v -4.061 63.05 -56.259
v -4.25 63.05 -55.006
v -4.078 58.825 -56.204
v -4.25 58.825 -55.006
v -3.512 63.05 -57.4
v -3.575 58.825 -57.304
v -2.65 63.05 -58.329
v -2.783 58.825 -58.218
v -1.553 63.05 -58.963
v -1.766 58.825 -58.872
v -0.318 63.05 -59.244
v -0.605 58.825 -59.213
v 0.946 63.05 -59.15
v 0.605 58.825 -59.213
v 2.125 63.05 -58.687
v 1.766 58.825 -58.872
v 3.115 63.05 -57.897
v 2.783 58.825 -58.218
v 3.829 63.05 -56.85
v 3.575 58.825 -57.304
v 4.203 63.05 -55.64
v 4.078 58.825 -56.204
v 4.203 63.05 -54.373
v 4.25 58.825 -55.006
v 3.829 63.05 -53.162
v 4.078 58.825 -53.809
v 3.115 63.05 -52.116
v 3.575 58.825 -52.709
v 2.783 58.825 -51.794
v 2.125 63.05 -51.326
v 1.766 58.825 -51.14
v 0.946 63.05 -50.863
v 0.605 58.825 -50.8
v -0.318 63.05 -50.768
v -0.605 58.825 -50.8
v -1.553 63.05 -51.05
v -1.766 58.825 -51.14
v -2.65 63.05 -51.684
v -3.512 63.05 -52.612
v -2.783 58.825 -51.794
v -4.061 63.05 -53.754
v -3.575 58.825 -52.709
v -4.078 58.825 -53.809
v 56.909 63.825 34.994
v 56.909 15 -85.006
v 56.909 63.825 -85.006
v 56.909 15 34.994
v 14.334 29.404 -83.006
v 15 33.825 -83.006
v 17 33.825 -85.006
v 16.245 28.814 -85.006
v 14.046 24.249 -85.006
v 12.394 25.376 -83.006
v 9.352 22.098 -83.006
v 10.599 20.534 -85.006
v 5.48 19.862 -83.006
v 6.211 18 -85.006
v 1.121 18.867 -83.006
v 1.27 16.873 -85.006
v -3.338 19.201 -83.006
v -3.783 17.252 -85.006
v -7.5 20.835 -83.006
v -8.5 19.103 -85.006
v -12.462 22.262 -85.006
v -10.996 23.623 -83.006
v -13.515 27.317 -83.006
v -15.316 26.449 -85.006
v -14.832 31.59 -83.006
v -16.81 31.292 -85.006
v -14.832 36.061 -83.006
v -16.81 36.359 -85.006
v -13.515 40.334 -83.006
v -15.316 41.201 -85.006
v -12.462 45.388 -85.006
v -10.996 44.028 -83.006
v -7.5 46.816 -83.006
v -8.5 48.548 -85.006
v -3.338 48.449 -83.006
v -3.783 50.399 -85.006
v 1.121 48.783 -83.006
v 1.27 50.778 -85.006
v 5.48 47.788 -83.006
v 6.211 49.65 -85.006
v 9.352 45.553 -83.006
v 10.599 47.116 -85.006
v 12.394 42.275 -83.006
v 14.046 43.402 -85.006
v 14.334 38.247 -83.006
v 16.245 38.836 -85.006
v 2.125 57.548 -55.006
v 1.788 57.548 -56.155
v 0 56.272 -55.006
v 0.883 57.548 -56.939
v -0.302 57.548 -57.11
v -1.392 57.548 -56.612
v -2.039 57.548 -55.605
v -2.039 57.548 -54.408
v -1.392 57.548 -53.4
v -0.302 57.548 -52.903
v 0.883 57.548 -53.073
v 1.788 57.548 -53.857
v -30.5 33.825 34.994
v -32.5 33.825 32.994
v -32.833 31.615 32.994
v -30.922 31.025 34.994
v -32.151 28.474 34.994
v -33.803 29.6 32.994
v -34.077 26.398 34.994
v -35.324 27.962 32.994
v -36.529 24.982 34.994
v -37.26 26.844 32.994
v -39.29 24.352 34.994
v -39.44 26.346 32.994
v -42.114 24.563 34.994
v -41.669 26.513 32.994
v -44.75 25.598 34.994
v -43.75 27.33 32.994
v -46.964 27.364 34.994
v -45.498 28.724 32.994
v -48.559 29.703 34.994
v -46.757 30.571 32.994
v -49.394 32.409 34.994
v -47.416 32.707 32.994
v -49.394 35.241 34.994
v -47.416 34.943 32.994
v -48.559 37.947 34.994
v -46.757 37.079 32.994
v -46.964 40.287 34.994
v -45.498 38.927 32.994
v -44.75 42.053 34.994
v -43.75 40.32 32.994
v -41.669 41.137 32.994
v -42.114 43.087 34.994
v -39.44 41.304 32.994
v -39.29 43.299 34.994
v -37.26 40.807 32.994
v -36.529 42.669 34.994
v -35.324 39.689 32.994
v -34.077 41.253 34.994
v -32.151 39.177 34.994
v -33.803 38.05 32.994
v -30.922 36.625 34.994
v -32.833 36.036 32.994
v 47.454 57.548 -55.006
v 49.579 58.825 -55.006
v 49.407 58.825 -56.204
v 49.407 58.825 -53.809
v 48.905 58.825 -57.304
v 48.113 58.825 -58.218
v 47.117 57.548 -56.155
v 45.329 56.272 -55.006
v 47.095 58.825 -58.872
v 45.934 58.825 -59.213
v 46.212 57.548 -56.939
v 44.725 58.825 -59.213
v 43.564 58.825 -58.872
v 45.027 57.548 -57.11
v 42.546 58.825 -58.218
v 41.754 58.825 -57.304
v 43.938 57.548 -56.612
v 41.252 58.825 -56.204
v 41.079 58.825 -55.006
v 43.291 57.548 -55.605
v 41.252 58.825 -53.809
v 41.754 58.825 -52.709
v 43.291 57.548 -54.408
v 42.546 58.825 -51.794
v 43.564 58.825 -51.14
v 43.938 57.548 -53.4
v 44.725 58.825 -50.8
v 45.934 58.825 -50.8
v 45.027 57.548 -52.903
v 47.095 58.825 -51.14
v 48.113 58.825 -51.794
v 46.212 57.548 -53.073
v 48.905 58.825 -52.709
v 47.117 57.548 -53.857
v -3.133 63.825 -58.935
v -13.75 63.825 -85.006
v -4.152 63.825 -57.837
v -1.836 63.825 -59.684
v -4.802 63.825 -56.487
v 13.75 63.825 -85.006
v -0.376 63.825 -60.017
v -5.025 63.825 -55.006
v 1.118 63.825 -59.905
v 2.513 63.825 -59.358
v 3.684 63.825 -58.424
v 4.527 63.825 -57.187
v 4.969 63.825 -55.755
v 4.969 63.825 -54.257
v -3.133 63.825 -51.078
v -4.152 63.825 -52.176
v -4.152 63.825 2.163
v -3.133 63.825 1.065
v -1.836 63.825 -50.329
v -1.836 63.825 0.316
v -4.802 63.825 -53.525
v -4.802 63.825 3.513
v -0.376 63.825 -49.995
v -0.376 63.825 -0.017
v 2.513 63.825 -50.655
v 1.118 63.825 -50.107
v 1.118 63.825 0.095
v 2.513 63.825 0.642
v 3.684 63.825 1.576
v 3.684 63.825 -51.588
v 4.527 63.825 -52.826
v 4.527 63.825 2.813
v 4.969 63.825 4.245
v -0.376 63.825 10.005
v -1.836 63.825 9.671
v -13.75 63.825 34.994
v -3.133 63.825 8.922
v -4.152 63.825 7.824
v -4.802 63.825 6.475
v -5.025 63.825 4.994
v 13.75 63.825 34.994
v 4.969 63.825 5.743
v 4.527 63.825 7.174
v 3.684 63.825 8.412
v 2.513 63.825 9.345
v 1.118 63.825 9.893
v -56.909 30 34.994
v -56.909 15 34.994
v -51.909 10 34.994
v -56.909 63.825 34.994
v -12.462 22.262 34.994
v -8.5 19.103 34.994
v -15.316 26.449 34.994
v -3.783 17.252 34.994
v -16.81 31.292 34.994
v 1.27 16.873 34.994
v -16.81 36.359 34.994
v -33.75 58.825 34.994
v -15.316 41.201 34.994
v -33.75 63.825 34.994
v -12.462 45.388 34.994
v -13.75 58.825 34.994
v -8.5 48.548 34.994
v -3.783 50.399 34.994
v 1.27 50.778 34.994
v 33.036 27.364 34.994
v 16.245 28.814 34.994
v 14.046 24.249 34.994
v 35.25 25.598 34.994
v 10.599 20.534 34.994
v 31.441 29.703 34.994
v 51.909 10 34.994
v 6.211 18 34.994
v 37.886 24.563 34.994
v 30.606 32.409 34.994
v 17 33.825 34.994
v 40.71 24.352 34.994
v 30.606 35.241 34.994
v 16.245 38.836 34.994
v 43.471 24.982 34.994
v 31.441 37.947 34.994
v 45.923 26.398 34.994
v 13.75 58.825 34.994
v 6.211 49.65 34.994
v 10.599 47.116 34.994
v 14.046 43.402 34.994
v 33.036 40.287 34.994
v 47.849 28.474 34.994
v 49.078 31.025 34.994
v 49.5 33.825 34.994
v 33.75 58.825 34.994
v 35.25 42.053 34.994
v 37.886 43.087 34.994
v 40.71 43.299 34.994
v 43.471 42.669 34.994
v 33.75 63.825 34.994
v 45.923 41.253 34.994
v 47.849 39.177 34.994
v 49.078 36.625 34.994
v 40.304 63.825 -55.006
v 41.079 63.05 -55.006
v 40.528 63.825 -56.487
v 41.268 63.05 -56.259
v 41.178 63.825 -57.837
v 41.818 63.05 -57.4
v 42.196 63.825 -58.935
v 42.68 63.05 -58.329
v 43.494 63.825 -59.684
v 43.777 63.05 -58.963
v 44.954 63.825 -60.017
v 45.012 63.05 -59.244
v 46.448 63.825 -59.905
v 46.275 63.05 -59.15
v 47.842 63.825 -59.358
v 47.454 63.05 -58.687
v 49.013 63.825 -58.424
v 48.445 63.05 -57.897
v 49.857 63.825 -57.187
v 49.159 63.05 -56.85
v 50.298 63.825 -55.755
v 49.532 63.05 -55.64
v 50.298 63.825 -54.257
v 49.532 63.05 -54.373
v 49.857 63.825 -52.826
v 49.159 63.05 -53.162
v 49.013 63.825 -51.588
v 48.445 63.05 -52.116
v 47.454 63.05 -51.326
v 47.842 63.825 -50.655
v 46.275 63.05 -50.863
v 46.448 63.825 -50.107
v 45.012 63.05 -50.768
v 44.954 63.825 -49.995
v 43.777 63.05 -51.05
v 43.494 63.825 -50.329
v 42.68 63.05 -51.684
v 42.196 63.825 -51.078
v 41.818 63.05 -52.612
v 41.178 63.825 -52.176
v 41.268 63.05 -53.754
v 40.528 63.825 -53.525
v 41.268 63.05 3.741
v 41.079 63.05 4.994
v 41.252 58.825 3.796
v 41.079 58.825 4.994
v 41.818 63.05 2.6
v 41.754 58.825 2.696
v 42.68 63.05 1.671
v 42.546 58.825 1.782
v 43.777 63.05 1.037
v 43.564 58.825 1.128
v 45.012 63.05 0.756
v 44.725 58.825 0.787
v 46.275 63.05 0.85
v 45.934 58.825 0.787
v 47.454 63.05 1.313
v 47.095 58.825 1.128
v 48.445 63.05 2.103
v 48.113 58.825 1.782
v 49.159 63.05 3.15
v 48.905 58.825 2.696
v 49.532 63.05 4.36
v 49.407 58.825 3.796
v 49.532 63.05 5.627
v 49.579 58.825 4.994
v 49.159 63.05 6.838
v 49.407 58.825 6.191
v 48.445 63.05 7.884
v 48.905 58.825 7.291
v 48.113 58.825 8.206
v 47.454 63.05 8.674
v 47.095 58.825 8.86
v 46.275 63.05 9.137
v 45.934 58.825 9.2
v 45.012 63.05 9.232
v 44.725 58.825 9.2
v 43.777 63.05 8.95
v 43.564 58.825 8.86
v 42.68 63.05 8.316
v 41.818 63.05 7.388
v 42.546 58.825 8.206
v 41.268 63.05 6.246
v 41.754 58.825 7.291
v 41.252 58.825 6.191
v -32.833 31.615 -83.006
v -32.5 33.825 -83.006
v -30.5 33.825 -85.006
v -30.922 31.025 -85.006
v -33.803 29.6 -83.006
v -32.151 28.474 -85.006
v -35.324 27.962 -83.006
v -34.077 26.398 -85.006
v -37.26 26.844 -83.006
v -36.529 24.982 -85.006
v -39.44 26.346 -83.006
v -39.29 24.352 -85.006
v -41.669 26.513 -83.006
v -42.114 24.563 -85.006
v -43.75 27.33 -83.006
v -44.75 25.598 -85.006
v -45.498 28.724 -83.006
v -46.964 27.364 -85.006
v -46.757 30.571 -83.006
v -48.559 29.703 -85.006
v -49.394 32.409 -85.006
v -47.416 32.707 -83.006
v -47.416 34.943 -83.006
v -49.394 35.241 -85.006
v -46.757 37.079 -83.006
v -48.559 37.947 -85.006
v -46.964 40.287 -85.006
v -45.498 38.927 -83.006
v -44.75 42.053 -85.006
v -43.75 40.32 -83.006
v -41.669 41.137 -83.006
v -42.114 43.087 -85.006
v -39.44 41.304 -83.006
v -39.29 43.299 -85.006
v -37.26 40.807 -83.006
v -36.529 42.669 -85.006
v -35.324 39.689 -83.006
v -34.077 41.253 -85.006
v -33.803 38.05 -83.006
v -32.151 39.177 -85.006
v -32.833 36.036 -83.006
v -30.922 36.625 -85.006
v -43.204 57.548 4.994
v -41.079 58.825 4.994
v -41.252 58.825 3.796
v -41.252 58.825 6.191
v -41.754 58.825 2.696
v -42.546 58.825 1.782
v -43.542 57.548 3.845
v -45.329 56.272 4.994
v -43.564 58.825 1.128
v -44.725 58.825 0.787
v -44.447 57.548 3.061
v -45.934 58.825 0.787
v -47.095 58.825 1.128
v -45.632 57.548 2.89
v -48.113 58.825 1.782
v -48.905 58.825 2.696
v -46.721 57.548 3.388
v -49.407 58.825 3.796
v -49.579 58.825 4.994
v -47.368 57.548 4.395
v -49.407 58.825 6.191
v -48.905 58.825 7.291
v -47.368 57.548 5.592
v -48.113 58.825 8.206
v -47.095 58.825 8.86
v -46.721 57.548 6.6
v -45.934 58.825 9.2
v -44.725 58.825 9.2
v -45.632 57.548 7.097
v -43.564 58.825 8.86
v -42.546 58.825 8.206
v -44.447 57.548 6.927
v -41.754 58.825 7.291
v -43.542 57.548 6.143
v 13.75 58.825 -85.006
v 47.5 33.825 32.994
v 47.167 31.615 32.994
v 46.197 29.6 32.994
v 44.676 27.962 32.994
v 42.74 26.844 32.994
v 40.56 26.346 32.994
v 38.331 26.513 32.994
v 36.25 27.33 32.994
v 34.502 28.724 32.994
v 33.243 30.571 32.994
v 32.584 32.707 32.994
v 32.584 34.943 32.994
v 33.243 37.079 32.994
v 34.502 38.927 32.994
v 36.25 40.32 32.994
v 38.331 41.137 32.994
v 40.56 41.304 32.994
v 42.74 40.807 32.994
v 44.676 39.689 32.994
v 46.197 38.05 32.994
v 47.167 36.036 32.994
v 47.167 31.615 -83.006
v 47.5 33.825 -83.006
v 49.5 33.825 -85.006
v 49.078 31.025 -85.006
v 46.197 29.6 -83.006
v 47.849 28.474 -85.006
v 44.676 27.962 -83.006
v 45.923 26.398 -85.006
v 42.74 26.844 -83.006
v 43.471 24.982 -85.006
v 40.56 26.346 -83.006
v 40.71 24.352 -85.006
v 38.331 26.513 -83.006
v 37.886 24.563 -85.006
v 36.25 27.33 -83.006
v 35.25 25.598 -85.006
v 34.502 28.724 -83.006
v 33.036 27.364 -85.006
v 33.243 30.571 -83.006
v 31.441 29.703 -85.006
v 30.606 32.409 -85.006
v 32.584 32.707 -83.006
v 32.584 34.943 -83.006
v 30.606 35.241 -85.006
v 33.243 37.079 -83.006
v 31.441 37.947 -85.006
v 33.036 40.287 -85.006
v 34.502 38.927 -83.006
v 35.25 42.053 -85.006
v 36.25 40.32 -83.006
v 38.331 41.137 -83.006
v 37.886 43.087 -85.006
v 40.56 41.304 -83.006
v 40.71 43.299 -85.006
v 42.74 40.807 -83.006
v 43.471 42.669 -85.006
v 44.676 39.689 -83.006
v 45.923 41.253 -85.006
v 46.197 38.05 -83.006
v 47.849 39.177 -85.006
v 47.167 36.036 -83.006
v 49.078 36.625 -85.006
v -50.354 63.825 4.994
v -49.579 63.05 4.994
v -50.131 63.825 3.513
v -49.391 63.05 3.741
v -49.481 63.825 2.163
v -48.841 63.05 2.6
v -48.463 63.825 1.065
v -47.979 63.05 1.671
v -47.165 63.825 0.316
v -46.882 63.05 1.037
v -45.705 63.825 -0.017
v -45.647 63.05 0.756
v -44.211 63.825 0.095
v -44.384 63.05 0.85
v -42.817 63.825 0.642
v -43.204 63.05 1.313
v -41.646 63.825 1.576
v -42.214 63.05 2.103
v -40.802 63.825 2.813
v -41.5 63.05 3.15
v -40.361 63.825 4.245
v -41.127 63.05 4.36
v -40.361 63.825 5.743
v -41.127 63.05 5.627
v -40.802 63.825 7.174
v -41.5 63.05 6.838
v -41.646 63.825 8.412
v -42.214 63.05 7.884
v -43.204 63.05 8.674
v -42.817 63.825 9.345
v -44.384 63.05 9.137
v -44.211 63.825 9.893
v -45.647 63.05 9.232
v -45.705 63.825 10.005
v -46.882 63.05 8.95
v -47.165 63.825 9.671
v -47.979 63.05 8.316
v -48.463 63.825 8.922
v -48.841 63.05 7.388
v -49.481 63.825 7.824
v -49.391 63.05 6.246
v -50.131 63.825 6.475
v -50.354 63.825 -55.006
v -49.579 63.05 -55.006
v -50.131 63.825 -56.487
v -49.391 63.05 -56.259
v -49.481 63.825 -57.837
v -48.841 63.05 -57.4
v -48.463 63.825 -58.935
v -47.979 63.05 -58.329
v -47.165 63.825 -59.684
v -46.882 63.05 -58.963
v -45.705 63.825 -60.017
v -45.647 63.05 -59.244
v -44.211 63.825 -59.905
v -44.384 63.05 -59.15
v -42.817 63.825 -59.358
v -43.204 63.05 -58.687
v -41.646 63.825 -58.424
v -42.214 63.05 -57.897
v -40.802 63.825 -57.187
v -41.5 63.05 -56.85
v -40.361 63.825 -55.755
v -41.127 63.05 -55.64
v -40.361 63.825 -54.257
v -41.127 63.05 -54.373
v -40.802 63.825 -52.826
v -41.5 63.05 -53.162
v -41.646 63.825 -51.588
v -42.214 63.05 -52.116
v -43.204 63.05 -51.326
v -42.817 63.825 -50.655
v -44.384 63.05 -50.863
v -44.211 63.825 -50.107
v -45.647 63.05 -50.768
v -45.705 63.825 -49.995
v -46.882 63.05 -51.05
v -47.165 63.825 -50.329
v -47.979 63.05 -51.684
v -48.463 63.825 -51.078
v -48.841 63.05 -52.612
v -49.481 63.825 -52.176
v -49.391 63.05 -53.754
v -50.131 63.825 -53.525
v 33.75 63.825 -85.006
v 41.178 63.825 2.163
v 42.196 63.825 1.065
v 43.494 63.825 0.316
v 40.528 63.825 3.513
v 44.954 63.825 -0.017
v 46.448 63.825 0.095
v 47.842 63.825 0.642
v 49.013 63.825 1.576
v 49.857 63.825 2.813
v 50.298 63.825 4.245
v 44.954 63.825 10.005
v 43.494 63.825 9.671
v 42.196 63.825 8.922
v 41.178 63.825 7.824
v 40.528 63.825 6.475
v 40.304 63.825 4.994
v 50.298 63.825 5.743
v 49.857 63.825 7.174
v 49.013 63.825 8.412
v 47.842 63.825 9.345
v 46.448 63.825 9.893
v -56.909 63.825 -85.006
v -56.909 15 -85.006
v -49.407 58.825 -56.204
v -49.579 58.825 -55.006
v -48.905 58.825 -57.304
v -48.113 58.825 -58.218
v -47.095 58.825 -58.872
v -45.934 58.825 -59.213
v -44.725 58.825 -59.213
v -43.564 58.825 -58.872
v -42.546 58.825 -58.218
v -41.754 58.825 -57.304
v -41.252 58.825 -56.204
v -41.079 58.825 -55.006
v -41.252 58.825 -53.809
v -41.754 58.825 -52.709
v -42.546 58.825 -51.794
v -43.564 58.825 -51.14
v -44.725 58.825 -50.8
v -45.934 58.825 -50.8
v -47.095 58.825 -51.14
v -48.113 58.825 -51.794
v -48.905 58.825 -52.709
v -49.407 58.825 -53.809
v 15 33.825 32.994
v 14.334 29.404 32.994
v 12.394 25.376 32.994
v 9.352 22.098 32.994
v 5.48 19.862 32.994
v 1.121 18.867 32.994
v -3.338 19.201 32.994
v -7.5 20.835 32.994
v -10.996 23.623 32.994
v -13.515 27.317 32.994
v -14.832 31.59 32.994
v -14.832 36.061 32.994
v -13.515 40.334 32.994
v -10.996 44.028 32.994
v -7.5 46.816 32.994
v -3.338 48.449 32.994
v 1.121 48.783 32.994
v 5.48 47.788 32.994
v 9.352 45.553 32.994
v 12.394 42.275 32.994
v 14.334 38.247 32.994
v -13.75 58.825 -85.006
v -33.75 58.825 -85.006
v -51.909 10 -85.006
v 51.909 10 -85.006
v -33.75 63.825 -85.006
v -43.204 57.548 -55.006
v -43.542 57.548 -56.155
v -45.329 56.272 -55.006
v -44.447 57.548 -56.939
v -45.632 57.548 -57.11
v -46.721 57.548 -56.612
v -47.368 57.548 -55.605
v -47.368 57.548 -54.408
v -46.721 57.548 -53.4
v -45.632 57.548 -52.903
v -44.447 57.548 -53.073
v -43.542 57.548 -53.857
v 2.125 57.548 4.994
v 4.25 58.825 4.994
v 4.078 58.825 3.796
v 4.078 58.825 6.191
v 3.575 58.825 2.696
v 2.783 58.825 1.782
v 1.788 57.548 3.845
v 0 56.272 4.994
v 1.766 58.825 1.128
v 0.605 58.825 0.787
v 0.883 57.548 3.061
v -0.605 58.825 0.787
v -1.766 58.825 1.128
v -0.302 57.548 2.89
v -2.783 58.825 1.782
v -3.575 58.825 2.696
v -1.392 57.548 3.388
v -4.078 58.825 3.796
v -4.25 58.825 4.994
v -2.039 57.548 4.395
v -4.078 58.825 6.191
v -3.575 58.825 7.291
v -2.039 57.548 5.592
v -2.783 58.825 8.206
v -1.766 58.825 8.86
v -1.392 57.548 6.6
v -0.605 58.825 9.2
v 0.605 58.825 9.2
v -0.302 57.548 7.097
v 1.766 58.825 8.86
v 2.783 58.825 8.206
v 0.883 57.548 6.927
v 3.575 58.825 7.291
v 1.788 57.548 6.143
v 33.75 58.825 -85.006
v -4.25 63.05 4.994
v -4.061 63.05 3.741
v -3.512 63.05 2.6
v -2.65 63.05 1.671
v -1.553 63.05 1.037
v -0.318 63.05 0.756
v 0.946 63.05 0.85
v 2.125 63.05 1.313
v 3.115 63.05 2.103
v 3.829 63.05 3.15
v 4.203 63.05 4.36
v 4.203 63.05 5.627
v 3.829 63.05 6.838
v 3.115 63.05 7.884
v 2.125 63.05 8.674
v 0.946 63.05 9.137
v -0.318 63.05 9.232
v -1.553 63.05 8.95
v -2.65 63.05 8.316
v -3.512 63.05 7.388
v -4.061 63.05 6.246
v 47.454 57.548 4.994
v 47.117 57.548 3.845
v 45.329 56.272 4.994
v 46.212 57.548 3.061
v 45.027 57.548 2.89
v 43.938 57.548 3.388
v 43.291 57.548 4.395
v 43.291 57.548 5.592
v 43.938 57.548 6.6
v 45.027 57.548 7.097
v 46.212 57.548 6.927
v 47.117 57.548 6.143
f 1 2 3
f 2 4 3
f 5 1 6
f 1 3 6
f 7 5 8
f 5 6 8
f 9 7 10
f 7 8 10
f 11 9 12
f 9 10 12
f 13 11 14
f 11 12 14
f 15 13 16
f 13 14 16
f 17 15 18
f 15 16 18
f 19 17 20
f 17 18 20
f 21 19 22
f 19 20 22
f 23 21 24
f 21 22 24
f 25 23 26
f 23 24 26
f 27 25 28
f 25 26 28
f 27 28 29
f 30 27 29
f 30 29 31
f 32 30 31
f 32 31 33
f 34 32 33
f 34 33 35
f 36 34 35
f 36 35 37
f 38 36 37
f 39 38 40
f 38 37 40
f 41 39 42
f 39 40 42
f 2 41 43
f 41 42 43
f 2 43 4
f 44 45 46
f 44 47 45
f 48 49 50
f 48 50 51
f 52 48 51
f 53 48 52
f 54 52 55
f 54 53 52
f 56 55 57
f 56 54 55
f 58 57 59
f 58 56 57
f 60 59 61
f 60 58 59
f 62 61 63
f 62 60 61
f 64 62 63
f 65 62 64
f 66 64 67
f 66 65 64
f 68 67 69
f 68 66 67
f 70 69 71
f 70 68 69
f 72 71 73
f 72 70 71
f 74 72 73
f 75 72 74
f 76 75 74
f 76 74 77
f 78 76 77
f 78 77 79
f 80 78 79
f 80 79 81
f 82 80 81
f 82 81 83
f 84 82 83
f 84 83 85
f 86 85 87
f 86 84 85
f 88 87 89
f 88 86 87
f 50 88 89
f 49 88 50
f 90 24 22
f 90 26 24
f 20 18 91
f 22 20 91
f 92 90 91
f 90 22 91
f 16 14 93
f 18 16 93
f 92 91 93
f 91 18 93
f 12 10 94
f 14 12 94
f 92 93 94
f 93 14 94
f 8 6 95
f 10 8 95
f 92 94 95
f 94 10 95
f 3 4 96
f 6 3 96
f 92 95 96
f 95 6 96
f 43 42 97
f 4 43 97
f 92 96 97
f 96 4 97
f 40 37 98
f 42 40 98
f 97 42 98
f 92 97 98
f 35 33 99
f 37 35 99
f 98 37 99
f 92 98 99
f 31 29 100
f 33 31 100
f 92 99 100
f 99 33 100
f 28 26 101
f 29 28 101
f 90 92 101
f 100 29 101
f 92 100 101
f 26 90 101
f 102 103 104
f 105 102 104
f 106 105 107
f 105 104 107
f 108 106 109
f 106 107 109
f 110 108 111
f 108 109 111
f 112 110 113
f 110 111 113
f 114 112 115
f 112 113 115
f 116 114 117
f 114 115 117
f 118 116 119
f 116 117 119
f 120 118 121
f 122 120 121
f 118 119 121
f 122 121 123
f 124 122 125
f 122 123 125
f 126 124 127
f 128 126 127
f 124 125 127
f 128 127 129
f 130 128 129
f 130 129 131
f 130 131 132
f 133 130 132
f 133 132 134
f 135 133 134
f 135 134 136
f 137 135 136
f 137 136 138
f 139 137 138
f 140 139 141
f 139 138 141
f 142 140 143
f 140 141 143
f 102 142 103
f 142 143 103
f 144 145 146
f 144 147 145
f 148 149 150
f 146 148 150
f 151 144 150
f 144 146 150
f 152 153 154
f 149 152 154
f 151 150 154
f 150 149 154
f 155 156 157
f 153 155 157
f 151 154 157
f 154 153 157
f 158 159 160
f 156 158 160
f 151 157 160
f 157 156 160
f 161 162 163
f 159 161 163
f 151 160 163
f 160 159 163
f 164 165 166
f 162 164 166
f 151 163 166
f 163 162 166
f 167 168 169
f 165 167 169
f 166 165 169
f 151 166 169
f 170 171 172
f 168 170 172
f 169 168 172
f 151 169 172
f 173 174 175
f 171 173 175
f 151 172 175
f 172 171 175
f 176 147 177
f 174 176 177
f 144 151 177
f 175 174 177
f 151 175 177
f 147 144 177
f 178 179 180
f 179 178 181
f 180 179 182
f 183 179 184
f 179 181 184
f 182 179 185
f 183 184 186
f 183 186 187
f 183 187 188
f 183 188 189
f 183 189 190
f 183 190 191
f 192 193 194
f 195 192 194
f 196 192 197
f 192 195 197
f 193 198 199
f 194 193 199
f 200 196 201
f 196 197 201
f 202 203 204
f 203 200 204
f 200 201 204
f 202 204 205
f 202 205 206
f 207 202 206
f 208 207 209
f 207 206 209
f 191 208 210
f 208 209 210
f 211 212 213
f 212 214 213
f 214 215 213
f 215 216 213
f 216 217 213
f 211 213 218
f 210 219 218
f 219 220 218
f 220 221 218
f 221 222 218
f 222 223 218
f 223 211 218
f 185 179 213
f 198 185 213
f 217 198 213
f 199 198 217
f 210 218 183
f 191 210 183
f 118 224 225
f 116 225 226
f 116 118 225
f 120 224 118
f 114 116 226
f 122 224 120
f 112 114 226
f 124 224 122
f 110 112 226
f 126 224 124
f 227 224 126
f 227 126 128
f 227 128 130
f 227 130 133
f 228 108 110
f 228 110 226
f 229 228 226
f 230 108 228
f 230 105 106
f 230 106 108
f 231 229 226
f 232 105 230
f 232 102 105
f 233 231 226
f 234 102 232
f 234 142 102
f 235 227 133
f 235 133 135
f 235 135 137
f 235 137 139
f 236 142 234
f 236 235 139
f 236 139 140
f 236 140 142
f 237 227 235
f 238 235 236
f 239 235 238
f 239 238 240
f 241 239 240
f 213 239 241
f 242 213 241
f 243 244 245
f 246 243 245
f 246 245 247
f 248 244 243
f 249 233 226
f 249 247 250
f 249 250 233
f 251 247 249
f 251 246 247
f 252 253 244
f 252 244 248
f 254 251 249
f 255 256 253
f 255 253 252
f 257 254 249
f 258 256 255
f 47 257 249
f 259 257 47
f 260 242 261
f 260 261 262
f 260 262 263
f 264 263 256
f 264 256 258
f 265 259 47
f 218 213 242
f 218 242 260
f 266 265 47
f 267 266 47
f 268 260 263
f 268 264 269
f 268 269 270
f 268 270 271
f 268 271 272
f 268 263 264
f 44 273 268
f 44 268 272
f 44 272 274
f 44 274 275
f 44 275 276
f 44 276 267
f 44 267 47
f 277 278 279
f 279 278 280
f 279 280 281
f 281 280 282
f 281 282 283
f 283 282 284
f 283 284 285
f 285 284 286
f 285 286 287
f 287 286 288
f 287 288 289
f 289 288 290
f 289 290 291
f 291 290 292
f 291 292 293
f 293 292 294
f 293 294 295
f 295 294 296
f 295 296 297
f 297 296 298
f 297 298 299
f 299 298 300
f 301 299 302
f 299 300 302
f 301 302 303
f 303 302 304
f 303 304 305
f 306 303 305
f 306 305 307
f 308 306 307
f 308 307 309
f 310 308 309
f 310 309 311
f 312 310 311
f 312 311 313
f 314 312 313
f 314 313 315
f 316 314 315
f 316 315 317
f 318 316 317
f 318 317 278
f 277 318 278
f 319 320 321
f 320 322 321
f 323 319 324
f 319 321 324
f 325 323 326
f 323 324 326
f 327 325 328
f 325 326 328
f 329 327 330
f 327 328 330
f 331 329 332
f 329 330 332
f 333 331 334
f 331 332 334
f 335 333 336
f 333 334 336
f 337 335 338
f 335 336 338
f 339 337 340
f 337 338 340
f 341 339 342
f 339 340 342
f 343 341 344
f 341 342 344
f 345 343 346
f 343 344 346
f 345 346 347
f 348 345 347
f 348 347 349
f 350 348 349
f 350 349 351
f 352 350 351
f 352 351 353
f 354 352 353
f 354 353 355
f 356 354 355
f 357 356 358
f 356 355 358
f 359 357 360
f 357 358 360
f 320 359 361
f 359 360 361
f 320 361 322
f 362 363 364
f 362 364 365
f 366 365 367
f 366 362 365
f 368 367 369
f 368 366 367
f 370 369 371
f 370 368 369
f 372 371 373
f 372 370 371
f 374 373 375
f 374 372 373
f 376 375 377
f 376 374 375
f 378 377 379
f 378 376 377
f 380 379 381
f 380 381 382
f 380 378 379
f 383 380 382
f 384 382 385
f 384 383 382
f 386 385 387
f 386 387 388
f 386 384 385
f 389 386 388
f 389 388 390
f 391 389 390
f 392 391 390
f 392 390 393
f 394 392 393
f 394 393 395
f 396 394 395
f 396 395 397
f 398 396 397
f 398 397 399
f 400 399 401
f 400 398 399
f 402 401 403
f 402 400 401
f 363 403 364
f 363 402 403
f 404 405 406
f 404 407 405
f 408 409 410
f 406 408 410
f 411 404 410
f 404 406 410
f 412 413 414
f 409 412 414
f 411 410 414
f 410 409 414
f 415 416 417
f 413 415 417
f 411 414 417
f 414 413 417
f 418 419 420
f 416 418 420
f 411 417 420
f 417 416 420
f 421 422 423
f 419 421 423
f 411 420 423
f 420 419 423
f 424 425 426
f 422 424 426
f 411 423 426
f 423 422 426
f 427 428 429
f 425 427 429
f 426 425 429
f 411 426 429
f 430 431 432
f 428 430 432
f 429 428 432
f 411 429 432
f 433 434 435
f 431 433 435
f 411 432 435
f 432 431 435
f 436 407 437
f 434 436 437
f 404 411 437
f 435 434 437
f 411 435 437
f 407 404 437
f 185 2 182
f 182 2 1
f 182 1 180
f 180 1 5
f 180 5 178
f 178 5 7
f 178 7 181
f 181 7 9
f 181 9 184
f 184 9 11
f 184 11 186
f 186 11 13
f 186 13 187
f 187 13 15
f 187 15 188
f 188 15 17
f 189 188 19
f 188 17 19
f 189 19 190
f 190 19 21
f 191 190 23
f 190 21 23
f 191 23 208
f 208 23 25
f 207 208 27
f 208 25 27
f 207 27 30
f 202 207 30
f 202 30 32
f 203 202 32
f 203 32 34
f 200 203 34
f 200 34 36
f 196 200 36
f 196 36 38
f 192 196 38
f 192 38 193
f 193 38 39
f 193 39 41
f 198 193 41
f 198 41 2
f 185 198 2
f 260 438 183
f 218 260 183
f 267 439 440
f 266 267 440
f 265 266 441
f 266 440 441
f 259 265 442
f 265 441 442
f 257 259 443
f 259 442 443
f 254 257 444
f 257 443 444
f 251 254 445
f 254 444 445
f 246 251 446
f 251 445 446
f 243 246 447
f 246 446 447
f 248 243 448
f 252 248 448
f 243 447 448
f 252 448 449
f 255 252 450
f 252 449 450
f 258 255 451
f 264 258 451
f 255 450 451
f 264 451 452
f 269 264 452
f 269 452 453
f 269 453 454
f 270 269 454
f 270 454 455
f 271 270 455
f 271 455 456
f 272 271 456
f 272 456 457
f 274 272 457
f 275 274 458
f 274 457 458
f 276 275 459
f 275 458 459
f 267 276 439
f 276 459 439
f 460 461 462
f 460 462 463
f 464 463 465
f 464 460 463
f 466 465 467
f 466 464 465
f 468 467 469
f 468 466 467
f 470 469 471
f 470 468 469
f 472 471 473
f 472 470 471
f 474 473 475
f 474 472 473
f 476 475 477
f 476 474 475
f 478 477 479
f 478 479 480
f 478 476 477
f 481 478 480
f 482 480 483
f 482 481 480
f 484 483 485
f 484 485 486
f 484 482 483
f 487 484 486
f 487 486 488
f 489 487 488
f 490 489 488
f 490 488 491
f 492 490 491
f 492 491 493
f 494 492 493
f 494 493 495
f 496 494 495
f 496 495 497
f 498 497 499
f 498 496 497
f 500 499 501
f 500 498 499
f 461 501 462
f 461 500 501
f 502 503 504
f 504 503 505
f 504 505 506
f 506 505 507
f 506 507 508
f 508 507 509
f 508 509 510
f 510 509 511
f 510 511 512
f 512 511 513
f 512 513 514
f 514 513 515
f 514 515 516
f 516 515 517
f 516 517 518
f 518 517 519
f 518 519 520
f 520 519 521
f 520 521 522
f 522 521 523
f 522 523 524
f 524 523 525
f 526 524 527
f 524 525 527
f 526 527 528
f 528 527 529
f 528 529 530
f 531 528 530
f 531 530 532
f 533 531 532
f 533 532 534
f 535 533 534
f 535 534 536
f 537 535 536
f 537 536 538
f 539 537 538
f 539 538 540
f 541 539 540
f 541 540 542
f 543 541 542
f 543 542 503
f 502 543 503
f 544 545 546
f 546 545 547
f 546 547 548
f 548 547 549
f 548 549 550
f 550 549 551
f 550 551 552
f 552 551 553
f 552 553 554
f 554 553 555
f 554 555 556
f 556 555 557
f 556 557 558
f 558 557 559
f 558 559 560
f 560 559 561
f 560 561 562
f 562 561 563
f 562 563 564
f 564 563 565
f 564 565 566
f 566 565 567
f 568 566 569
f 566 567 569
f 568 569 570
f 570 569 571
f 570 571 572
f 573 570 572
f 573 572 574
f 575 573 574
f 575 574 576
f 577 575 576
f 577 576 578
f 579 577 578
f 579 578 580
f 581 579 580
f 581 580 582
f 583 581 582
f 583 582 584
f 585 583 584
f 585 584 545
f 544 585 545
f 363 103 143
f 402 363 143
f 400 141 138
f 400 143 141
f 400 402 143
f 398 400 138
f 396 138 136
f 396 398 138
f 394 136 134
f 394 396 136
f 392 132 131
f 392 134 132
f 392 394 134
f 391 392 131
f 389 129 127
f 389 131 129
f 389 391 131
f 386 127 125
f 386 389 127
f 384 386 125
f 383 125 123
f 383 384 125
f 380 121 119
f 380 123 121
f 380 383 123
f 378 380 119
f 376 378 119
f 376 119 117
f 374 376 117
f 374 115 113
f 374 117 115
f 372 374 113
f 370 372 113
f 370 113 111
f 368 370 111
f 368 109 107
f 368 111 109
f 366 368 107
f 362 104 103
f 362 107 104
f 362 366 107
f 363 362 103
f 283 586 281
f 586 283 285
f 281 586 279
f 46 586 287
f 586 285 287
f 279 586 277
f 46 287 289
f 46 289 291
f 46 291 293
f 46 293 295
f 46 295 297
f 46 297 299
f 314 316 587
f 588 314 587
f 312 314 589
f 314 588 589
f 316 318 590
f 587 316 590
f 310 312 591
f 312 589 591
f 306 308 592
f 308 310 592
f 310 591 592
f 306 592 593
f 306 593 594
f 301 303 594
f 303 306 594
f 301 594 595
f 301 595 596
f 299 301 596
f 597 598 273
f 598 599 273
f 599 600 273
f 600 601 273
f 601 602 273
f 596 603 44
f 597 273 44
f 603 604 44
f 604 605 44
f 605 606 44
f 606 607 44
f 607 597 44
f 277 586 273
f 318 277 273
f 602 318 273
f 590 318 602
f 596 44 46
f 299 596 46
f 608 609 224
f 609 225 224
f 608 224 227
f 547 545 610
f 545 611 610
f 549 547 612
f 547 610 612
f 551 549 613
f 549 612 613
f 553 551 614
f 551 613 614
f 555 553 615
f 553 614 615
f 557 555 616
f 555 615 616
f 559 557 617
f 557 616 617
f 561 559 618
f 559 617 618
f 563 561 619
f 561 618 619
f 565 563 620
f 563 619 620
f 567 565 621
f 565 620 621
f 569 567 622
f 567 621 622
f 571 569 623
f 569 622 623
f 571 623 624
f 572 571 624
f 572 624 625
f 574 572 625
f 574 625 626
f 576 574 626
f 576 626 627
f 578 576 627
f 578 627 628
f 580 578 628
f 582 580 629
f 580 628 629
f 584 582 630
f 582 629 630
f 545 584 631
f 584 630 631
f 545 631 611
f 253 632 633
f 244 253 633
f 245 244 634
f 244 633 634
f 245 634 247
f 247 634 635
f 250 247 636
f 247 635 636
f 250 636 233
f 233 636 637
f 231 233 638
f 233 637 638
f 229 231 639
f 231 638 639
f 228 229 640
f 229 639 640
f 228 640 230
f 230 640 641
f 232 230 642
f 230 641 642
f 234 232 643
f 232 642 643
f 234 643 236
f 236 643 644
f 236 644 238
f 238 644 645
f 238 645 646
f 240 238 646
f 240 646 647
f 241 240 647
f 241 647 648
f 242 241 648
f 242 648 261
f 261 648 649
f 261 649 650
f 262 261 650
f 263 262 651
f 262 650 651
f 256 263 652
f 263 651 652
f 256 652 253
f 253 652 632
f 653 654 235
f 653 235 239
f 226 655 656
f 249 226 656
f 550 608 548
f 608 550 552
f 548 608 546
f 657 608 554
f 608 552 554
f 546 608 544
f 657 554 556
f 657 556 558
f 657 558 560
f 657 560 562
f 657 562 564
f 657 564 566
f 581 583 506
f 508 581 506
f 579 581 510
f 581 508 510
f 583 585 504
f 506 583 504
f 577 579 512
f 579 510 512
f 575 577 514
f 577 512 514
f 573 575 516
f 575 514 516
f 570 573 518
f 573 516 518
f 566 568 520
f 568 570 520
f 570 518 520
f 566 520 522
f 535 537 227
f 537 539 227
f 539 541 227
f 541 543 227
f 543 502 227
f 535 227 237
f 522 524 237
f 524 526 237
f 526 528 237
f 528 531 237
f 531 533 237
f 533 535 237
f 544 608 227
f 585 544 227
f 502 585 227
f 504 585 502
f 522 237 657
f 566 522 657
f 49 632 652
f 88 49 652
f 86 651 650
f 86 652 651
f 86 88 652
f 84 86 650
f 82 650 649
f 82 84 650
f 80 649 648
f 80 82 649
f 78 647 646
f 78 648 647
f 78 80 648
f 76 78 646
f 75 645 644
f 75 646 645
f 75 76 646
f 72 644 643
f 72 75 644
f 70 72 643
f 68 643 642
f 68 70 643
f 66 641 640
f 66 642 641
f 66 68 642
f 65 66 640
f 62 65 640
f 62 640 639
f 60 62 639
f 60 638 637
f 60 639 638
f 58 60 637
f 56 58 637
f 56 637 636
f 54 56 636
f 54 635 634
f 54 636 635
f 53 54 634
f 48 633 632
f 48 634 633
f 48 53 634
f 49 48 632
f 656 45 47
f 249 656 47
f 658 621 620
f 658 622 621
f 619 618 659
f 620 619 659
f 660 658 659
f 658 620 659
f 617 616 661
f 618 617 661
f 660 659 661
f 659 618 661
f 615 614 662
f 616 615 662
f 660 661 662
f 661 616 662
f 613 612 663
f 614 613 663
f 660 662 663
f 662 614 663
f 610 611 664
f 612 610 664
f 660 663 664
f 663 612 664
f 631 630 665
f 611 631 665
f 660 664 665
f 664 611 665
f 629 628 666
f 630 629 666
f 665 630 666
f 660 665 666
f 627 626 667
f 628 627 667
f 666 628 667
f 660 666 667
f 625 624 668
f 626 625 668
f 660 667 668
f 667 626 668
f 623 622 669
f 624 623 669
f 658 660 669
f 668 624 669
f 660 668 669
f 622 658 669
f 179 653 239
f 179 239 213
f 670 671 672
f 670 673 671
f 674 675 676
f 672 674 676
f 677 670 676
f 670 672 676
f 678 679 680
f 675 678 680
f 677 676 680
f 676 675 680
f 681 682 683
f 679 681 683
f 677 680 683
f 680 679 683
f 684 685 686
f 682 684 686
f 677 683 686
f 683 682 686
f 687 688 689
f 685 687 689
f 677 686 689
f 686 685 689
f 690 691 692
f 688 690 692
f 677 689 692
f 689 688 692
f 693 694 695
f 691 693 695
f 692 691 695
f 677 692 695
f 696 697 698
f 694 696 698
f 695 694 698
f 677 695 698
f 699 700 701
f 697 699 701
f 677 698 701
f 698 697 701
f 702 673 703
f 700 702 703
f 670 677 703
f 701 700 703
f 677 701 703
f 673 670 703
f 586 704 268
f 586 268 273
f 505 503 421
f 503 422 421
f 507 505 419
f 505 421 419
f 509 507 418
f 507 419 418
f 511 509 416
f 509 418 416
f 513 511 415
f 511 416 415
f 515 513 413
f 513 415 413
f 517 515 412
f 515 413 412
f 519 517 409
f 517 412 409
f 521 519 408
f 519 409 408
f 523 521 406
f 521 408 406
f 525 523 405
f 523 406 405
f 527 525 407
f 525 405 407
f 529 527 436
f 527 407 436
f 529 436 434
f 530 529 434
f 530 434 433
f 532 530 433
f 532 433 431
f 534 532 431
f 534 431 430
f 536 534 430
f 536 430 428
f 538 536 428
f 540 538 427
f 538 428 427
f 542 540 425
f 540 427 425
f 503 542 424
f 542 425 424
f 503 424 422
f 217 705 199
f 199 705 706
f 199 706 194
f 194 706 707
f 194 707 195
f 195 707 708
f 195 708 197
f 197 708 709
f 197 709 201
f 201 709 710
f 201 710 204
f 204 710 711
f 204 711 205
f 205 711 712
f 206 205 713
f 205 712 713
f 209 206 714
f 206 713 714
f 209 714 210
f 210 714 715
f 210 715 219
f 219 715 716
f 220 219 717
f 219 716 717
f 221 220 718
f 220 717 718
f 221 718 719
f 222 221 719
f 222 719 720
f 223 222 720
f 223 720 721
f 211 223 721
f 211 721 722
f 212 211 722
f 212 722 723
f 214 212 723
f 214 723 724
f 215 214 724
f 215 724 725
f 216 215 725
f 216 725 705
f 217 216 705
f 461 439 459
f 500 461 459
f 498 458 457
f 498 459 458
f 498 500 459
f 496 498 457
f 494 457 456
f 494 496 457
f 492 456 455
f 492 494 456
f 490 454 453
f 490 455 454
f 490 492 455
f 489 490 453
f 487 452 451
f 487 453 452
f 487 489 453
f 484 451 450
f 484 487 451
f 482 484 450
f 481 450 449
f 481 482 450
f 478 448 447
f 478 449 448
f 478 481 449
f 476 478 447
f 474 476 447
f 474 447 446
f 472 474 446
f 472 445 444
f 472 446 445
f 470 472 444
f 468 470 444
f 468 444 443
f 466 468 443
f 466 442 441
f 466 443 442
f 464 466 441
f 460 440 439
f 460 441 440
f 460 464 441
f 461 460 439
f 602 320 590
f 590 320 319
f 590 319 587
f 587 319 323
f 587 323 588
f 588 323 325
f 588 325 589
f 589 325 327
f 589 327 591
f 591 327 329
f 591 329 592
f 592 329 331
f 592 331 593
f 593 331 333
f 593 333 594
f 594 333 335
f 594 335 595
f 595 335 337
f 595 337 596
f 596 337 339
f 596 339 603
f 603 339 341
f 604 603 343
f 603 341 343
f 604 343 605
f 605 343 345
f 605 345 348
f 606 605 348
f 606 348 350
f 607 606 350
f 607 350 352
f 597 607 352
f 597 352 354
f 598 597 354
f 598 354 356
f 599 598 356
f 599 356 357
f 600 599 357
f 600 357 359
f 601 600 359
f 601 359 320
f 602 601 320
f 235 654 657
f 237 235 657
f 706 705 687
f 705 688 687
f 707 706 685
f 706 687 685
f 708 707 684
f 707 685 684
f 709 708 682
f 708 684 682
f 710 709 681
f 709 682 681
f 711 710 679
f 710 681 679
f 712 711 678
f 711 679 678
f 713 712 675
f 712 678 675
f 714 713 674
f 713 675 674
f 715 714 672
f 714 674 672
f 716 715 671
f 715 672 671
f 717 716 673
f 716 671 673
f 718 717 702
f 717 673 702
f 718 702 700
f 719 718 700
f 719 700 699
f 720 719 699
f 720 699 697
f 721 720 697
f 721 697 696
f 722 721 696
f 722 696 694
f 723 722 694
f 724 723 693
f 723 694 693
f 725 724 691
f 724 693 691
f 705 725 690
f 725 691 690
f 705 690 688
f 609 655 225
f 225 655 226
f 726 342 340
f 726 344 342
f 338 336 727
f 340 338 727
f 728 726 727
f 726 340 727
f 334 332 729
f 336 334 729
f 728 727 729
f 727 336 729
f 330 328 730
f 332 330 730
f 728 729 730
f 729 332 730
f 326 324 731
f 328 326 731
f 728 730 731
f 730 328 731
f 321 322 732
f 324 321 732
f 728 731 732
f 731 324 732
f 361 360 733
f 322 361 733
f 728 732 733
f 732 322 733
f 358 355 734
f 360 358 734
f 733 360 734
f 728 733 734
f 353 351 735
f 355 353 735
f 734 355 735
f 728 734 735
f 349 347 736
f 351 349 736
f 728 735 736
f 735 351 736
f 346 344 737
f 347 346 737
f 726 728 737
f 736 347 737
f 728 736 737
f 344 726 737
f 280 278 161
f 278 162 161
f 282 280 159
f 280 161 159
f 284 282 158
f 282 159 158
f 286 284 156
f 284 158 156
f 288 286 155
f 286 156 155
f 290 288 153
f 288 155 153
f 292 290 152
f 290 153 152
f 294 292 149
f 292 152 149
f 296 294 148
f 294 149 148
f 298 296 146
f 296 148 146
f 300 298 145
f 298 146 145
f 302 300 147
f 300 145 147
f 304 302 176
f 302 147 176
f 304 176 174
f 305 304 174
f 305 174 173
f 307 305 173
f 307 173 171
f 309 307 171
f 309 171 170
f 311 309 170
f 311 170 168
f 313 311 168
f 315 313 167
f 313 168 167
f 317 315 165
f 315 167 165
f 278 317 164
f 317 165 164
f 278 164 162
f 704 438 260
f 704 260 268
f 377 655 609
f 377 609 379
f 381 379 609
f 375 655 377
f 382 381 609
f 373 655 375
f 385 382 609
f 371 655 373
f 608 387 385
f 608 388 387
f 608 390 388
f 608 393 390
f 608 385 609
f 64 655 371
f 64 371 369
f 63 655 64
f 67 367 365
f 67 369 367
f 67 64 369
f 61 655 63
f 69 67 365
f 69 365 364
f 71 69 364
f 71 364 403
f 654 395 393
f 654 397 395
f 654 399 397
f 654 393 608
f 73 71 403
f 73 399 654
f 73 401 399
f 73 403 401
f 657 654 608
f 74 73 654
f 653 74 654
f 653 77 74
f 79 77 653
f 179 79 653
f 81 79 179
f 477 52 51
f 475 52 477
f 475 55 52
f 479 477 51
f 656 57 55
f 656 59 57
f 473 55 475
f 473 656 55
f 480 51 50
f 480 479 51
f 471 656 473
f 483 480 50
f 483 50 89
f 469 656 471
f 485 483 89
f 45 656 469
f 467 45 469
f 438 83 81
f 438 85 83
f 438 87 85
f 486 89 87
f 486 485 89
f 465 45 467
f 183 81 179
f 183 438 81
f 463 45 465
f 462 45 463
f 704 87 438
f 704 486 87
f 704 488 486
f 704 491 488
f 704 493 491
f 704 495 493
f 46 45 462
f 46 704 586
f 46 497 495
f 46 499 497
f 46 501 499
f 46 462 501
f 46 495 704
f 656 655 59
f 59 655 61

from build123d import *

# Parameters (mm, degrees)
SKETCH_1_W                    = 120.40825663
SKETCH_1_H                    = 69.987299166
EXTRUDE_1_DEPTH               = 30
CUT_EXTRUDE_1_DEPTH           = 98.070897342
CUT_EXTRUDE_1_DEPTH_BACK      = 98.070897342
SKETCH_2_W                    = 9.395515641
SKETCH_2_H                    = 48.745871703
SKETCH_3_W                    = 113.81790299
SKETCH_3_H                    = 30
EXTRUDE_2_DEPTH               = 69.987299167
SKETCH_4_W                    = 113.81790299
SKETCH_4_H                    = 3.825309314
EXTRUDE_3_DEPTH               = 69.987299167
SKETCH_5_W                    = 120
SKETCH_5_H                    = 63.825309314
EXTRUDE_4_DEPTH               = 113.817902989
CUT_EXTRUDE_2_DEPTH           = 148.350937795
CUT_EXTRUDE_2_DEPTH_BACK      = 148.350937795
SKETCH_6_R                    = 15
SKETCH_6_R_2                  = 7.5
CUT_EXTRUDE_3_DEPTH           = 148.350937795
CUT_EXTRUDE_3_DEPTH_BACK      = 148.350937795
SKETCH_7_W                    = 113.81790299
SKETCH_7_H                    = 11.234457722
CUT_EXTRUDE_4_DEPTH           = 148.350937795
CUT_EXTRUDE_4_DEPTH_BACK      = 148.350937795
SKETCH_8_W                    = 20
SKETCH_8_H                    = 5
CHAMFER_1_SIZE                = 5
CHAMFER_2_SIZE                = 2
HOLE_WIZARD_M10_1_D           = 8.5
HOLE_WIZARD_M10_1_DEPTH       = 5
HOLE_WIZARD_M10_1_CSINK_D     = 10.05
HOLE_WIZARD_M10_1_CSINK_ANGLE = 90
HOLE_WIZARD_M10_1_TIP         = 2.553657631


with BuildPart() as part:
    # 草图1 → 凸台-拉伸1 (new body)
    with BuildSketch(Plane(origin=(0, 0, 0), x_dir=(1, 0, 0), z_dir=(0, 1, 0))):
        Rectangle(SKETCH_1_W, SKETCH_1_H)
    extrude(amount=EXTRUDE_1_DEPTH)

    # 草图2 → 切除-拉伸1 (cut, two sides: drawn at the far end of the back side and taken through both)
    with BuildSketch(Plane.XY.offset(34.993649583).offset(-CUT_EXTRUDE_1_DEPTH_BACK)):
        with Locations((-61.606709315, 9.40788871)):
            Rectangle(SKETCH_2_W, SKETCH_2_H)
        Polygon((56.908951495, -11.846624373), (56.908951495, 33.780824562), (63.684524074, 33.780824562), (62.913393862, -11.846624373), align=None)
    extrude(amount=CUT_EXTRUDE_1_DEPTH + CUT_EXTRUDE_1_DEPTH_BACK, mode=Mode.SUBTRACT)

    # 草图3 → 凸台-拉伸2 (add)
    with BuildSketch(Plane.XY.offset(34.993649583)):
        with Locations((0, 45)):
            Rectangle(SKETCH_3_W, SKETCH_3_H)
    extrude(amount=-EXTRUDE_2_DEPTH)

    # 草图4 → 凸台-拉伸3 (add)
    with BuildSketch(Plane.XY.offset(34.993649583)):
        with Locations((0, 61.912654657)):
            Rectangle(SKETCH_4_W, SKETCH_4_H)
    extrude(amount=-EXTRUDE_3_DEPTH)

    # 草图5 → 凸台-拉伸4 (add)
    with BuildSketch(Plane(origin=(56.908951495, 0, 0), x_dir=(0, 0, -1), z_dir=(1, 0, 0))):
        with Locations((25.006350417, 31.912654657)):
            Rectangle(SKETCH_5_W, SKETCH_5_H)
    extrude(amount=-EXTRUDE_4_DEPTH)

    # 草图6 → 切除-拉伸2 (cut, two sides: drawn at the far end of the back side and taken through both)
    with BuildSketch(Plane.XY.offset(34.993649583).offset(-CUT_EXTRUDE_2_DEPTH_BACK)):
        with Locations((0, 33.825309314)):
            Circle(SKETCH_6_R)
        with Locations((-40, 33.825309314)):
            Circle(SKETCH_6_R_2)
        with Locations((40, 33.825309314)):
            Circle(SKETCH_6_R_2)
    extrude(amount=CUT_EXTRUDE_2_DEPTH + CUT_EXTRUDE_2_DEPTH_BACK, mode=Mode.SUBTRACT)

    # 草图7 → 切除-拉伸3 (cut, two sides: drawn at the far end of the back side and taken through both)
    with BuildSketch(Plane.XY.offset(34.993649583).offset(-CUT_EXTRUDE_3_DEPTH_BACK)):
        with Locations((0, 4.382771139)):
            Rectangle(SKETCH_7_W, SKETCH_7_H)
    extrude(amount=CUT_EXTRUDE_3_DEPTH + CUT_EXTRUDE_3_DEPTH_BACK, mode=Mode.SUBTRACT)

    # 草图8 → 切除-拉伸4 (cut, two sides: drawn at the far end of the back side and taken through both)
    with BuildSketch(Plane.XY.offset(34.993649583).offset(-CUT_EXTRUDE_4_DEPTH_BACK)):
        with Locations((-23.75, 61.325309314)):
            Rectangle(SKETCH_8_W, SKETCH_8_H)
        with Locations((23.75, 61.325309314)):
            Rectangle(SKETCH_8_W, SKETCH_8_H)
    extrude(amount=CUT_EXTRUDE_4_DEPTH + CUT_EXTRUDE_4_DEPTH_BACK, mode=Mode.SUBTRACT)

    # 倒角1
    chamfer_1_edges = [part.edges().sort_by_distance(p)[0] for p in [
        (-56.908951495, 10, -25.006350417),
        (56.908951495, 10, -25.006350417),
    ]]
    chamfer(chamfer_1_edges, length=CHAMFER_1_SIZE)

    # 倒角2
    chamfer_2_edges = [part.edges().sort_by_distance(p)[0] for p in [
        (32.5, 33.825309314, -85.006350417),
        (32.5, 33.825309314, 34.993649583),
        (-47.5, 33.825309314, -85.006350417),
        (-47.5, 33.825309314, 34.993649583),
        (-15, 33.825309314, -85.006350417),
        (-15, 33.825309314, 34.993649583),
    ]]
    chamfer(chamfer_2_edges, length=CHAMFER_2_SIZE)

    # M10 螺纹孔1
    with Locations(Plane(origin=(0, 63.825309314, 0), x_dir=(1, 0, 0), z_dir=(0, 1, 0))):
        with Locations((-45.329475747, 55.006350417), (-45.329475747, -4.993649583), (0, -4.993649583), (45.329475747, -4.993649583), (45.329475747, 55.006350417), (0, 55.006350417)):
            CounterSinkHole(HOLE_WIZARD_M10_1_D / 2, HOLE_WIZARD_M10_1_CSINK_D / 2, depth=HOLE_WIZARD_M10_1_DEPTH, counter_sink_angle=HOLE_WIZARD_M10_1_CSINK_ANGLE)
            with Locations((0, 0, -(HOLE_WIZARD_M10_1_DEPTH + HOLE_WIZARD_M10_1_TIP / 2))):  # 118° drill point
                Cone(0, HOLE_WIZARD_M10_1_D / 2, HOLE_WIZARD_M10_1_TIP, mode=Mode.SUBTRACT)


solid = part.part
